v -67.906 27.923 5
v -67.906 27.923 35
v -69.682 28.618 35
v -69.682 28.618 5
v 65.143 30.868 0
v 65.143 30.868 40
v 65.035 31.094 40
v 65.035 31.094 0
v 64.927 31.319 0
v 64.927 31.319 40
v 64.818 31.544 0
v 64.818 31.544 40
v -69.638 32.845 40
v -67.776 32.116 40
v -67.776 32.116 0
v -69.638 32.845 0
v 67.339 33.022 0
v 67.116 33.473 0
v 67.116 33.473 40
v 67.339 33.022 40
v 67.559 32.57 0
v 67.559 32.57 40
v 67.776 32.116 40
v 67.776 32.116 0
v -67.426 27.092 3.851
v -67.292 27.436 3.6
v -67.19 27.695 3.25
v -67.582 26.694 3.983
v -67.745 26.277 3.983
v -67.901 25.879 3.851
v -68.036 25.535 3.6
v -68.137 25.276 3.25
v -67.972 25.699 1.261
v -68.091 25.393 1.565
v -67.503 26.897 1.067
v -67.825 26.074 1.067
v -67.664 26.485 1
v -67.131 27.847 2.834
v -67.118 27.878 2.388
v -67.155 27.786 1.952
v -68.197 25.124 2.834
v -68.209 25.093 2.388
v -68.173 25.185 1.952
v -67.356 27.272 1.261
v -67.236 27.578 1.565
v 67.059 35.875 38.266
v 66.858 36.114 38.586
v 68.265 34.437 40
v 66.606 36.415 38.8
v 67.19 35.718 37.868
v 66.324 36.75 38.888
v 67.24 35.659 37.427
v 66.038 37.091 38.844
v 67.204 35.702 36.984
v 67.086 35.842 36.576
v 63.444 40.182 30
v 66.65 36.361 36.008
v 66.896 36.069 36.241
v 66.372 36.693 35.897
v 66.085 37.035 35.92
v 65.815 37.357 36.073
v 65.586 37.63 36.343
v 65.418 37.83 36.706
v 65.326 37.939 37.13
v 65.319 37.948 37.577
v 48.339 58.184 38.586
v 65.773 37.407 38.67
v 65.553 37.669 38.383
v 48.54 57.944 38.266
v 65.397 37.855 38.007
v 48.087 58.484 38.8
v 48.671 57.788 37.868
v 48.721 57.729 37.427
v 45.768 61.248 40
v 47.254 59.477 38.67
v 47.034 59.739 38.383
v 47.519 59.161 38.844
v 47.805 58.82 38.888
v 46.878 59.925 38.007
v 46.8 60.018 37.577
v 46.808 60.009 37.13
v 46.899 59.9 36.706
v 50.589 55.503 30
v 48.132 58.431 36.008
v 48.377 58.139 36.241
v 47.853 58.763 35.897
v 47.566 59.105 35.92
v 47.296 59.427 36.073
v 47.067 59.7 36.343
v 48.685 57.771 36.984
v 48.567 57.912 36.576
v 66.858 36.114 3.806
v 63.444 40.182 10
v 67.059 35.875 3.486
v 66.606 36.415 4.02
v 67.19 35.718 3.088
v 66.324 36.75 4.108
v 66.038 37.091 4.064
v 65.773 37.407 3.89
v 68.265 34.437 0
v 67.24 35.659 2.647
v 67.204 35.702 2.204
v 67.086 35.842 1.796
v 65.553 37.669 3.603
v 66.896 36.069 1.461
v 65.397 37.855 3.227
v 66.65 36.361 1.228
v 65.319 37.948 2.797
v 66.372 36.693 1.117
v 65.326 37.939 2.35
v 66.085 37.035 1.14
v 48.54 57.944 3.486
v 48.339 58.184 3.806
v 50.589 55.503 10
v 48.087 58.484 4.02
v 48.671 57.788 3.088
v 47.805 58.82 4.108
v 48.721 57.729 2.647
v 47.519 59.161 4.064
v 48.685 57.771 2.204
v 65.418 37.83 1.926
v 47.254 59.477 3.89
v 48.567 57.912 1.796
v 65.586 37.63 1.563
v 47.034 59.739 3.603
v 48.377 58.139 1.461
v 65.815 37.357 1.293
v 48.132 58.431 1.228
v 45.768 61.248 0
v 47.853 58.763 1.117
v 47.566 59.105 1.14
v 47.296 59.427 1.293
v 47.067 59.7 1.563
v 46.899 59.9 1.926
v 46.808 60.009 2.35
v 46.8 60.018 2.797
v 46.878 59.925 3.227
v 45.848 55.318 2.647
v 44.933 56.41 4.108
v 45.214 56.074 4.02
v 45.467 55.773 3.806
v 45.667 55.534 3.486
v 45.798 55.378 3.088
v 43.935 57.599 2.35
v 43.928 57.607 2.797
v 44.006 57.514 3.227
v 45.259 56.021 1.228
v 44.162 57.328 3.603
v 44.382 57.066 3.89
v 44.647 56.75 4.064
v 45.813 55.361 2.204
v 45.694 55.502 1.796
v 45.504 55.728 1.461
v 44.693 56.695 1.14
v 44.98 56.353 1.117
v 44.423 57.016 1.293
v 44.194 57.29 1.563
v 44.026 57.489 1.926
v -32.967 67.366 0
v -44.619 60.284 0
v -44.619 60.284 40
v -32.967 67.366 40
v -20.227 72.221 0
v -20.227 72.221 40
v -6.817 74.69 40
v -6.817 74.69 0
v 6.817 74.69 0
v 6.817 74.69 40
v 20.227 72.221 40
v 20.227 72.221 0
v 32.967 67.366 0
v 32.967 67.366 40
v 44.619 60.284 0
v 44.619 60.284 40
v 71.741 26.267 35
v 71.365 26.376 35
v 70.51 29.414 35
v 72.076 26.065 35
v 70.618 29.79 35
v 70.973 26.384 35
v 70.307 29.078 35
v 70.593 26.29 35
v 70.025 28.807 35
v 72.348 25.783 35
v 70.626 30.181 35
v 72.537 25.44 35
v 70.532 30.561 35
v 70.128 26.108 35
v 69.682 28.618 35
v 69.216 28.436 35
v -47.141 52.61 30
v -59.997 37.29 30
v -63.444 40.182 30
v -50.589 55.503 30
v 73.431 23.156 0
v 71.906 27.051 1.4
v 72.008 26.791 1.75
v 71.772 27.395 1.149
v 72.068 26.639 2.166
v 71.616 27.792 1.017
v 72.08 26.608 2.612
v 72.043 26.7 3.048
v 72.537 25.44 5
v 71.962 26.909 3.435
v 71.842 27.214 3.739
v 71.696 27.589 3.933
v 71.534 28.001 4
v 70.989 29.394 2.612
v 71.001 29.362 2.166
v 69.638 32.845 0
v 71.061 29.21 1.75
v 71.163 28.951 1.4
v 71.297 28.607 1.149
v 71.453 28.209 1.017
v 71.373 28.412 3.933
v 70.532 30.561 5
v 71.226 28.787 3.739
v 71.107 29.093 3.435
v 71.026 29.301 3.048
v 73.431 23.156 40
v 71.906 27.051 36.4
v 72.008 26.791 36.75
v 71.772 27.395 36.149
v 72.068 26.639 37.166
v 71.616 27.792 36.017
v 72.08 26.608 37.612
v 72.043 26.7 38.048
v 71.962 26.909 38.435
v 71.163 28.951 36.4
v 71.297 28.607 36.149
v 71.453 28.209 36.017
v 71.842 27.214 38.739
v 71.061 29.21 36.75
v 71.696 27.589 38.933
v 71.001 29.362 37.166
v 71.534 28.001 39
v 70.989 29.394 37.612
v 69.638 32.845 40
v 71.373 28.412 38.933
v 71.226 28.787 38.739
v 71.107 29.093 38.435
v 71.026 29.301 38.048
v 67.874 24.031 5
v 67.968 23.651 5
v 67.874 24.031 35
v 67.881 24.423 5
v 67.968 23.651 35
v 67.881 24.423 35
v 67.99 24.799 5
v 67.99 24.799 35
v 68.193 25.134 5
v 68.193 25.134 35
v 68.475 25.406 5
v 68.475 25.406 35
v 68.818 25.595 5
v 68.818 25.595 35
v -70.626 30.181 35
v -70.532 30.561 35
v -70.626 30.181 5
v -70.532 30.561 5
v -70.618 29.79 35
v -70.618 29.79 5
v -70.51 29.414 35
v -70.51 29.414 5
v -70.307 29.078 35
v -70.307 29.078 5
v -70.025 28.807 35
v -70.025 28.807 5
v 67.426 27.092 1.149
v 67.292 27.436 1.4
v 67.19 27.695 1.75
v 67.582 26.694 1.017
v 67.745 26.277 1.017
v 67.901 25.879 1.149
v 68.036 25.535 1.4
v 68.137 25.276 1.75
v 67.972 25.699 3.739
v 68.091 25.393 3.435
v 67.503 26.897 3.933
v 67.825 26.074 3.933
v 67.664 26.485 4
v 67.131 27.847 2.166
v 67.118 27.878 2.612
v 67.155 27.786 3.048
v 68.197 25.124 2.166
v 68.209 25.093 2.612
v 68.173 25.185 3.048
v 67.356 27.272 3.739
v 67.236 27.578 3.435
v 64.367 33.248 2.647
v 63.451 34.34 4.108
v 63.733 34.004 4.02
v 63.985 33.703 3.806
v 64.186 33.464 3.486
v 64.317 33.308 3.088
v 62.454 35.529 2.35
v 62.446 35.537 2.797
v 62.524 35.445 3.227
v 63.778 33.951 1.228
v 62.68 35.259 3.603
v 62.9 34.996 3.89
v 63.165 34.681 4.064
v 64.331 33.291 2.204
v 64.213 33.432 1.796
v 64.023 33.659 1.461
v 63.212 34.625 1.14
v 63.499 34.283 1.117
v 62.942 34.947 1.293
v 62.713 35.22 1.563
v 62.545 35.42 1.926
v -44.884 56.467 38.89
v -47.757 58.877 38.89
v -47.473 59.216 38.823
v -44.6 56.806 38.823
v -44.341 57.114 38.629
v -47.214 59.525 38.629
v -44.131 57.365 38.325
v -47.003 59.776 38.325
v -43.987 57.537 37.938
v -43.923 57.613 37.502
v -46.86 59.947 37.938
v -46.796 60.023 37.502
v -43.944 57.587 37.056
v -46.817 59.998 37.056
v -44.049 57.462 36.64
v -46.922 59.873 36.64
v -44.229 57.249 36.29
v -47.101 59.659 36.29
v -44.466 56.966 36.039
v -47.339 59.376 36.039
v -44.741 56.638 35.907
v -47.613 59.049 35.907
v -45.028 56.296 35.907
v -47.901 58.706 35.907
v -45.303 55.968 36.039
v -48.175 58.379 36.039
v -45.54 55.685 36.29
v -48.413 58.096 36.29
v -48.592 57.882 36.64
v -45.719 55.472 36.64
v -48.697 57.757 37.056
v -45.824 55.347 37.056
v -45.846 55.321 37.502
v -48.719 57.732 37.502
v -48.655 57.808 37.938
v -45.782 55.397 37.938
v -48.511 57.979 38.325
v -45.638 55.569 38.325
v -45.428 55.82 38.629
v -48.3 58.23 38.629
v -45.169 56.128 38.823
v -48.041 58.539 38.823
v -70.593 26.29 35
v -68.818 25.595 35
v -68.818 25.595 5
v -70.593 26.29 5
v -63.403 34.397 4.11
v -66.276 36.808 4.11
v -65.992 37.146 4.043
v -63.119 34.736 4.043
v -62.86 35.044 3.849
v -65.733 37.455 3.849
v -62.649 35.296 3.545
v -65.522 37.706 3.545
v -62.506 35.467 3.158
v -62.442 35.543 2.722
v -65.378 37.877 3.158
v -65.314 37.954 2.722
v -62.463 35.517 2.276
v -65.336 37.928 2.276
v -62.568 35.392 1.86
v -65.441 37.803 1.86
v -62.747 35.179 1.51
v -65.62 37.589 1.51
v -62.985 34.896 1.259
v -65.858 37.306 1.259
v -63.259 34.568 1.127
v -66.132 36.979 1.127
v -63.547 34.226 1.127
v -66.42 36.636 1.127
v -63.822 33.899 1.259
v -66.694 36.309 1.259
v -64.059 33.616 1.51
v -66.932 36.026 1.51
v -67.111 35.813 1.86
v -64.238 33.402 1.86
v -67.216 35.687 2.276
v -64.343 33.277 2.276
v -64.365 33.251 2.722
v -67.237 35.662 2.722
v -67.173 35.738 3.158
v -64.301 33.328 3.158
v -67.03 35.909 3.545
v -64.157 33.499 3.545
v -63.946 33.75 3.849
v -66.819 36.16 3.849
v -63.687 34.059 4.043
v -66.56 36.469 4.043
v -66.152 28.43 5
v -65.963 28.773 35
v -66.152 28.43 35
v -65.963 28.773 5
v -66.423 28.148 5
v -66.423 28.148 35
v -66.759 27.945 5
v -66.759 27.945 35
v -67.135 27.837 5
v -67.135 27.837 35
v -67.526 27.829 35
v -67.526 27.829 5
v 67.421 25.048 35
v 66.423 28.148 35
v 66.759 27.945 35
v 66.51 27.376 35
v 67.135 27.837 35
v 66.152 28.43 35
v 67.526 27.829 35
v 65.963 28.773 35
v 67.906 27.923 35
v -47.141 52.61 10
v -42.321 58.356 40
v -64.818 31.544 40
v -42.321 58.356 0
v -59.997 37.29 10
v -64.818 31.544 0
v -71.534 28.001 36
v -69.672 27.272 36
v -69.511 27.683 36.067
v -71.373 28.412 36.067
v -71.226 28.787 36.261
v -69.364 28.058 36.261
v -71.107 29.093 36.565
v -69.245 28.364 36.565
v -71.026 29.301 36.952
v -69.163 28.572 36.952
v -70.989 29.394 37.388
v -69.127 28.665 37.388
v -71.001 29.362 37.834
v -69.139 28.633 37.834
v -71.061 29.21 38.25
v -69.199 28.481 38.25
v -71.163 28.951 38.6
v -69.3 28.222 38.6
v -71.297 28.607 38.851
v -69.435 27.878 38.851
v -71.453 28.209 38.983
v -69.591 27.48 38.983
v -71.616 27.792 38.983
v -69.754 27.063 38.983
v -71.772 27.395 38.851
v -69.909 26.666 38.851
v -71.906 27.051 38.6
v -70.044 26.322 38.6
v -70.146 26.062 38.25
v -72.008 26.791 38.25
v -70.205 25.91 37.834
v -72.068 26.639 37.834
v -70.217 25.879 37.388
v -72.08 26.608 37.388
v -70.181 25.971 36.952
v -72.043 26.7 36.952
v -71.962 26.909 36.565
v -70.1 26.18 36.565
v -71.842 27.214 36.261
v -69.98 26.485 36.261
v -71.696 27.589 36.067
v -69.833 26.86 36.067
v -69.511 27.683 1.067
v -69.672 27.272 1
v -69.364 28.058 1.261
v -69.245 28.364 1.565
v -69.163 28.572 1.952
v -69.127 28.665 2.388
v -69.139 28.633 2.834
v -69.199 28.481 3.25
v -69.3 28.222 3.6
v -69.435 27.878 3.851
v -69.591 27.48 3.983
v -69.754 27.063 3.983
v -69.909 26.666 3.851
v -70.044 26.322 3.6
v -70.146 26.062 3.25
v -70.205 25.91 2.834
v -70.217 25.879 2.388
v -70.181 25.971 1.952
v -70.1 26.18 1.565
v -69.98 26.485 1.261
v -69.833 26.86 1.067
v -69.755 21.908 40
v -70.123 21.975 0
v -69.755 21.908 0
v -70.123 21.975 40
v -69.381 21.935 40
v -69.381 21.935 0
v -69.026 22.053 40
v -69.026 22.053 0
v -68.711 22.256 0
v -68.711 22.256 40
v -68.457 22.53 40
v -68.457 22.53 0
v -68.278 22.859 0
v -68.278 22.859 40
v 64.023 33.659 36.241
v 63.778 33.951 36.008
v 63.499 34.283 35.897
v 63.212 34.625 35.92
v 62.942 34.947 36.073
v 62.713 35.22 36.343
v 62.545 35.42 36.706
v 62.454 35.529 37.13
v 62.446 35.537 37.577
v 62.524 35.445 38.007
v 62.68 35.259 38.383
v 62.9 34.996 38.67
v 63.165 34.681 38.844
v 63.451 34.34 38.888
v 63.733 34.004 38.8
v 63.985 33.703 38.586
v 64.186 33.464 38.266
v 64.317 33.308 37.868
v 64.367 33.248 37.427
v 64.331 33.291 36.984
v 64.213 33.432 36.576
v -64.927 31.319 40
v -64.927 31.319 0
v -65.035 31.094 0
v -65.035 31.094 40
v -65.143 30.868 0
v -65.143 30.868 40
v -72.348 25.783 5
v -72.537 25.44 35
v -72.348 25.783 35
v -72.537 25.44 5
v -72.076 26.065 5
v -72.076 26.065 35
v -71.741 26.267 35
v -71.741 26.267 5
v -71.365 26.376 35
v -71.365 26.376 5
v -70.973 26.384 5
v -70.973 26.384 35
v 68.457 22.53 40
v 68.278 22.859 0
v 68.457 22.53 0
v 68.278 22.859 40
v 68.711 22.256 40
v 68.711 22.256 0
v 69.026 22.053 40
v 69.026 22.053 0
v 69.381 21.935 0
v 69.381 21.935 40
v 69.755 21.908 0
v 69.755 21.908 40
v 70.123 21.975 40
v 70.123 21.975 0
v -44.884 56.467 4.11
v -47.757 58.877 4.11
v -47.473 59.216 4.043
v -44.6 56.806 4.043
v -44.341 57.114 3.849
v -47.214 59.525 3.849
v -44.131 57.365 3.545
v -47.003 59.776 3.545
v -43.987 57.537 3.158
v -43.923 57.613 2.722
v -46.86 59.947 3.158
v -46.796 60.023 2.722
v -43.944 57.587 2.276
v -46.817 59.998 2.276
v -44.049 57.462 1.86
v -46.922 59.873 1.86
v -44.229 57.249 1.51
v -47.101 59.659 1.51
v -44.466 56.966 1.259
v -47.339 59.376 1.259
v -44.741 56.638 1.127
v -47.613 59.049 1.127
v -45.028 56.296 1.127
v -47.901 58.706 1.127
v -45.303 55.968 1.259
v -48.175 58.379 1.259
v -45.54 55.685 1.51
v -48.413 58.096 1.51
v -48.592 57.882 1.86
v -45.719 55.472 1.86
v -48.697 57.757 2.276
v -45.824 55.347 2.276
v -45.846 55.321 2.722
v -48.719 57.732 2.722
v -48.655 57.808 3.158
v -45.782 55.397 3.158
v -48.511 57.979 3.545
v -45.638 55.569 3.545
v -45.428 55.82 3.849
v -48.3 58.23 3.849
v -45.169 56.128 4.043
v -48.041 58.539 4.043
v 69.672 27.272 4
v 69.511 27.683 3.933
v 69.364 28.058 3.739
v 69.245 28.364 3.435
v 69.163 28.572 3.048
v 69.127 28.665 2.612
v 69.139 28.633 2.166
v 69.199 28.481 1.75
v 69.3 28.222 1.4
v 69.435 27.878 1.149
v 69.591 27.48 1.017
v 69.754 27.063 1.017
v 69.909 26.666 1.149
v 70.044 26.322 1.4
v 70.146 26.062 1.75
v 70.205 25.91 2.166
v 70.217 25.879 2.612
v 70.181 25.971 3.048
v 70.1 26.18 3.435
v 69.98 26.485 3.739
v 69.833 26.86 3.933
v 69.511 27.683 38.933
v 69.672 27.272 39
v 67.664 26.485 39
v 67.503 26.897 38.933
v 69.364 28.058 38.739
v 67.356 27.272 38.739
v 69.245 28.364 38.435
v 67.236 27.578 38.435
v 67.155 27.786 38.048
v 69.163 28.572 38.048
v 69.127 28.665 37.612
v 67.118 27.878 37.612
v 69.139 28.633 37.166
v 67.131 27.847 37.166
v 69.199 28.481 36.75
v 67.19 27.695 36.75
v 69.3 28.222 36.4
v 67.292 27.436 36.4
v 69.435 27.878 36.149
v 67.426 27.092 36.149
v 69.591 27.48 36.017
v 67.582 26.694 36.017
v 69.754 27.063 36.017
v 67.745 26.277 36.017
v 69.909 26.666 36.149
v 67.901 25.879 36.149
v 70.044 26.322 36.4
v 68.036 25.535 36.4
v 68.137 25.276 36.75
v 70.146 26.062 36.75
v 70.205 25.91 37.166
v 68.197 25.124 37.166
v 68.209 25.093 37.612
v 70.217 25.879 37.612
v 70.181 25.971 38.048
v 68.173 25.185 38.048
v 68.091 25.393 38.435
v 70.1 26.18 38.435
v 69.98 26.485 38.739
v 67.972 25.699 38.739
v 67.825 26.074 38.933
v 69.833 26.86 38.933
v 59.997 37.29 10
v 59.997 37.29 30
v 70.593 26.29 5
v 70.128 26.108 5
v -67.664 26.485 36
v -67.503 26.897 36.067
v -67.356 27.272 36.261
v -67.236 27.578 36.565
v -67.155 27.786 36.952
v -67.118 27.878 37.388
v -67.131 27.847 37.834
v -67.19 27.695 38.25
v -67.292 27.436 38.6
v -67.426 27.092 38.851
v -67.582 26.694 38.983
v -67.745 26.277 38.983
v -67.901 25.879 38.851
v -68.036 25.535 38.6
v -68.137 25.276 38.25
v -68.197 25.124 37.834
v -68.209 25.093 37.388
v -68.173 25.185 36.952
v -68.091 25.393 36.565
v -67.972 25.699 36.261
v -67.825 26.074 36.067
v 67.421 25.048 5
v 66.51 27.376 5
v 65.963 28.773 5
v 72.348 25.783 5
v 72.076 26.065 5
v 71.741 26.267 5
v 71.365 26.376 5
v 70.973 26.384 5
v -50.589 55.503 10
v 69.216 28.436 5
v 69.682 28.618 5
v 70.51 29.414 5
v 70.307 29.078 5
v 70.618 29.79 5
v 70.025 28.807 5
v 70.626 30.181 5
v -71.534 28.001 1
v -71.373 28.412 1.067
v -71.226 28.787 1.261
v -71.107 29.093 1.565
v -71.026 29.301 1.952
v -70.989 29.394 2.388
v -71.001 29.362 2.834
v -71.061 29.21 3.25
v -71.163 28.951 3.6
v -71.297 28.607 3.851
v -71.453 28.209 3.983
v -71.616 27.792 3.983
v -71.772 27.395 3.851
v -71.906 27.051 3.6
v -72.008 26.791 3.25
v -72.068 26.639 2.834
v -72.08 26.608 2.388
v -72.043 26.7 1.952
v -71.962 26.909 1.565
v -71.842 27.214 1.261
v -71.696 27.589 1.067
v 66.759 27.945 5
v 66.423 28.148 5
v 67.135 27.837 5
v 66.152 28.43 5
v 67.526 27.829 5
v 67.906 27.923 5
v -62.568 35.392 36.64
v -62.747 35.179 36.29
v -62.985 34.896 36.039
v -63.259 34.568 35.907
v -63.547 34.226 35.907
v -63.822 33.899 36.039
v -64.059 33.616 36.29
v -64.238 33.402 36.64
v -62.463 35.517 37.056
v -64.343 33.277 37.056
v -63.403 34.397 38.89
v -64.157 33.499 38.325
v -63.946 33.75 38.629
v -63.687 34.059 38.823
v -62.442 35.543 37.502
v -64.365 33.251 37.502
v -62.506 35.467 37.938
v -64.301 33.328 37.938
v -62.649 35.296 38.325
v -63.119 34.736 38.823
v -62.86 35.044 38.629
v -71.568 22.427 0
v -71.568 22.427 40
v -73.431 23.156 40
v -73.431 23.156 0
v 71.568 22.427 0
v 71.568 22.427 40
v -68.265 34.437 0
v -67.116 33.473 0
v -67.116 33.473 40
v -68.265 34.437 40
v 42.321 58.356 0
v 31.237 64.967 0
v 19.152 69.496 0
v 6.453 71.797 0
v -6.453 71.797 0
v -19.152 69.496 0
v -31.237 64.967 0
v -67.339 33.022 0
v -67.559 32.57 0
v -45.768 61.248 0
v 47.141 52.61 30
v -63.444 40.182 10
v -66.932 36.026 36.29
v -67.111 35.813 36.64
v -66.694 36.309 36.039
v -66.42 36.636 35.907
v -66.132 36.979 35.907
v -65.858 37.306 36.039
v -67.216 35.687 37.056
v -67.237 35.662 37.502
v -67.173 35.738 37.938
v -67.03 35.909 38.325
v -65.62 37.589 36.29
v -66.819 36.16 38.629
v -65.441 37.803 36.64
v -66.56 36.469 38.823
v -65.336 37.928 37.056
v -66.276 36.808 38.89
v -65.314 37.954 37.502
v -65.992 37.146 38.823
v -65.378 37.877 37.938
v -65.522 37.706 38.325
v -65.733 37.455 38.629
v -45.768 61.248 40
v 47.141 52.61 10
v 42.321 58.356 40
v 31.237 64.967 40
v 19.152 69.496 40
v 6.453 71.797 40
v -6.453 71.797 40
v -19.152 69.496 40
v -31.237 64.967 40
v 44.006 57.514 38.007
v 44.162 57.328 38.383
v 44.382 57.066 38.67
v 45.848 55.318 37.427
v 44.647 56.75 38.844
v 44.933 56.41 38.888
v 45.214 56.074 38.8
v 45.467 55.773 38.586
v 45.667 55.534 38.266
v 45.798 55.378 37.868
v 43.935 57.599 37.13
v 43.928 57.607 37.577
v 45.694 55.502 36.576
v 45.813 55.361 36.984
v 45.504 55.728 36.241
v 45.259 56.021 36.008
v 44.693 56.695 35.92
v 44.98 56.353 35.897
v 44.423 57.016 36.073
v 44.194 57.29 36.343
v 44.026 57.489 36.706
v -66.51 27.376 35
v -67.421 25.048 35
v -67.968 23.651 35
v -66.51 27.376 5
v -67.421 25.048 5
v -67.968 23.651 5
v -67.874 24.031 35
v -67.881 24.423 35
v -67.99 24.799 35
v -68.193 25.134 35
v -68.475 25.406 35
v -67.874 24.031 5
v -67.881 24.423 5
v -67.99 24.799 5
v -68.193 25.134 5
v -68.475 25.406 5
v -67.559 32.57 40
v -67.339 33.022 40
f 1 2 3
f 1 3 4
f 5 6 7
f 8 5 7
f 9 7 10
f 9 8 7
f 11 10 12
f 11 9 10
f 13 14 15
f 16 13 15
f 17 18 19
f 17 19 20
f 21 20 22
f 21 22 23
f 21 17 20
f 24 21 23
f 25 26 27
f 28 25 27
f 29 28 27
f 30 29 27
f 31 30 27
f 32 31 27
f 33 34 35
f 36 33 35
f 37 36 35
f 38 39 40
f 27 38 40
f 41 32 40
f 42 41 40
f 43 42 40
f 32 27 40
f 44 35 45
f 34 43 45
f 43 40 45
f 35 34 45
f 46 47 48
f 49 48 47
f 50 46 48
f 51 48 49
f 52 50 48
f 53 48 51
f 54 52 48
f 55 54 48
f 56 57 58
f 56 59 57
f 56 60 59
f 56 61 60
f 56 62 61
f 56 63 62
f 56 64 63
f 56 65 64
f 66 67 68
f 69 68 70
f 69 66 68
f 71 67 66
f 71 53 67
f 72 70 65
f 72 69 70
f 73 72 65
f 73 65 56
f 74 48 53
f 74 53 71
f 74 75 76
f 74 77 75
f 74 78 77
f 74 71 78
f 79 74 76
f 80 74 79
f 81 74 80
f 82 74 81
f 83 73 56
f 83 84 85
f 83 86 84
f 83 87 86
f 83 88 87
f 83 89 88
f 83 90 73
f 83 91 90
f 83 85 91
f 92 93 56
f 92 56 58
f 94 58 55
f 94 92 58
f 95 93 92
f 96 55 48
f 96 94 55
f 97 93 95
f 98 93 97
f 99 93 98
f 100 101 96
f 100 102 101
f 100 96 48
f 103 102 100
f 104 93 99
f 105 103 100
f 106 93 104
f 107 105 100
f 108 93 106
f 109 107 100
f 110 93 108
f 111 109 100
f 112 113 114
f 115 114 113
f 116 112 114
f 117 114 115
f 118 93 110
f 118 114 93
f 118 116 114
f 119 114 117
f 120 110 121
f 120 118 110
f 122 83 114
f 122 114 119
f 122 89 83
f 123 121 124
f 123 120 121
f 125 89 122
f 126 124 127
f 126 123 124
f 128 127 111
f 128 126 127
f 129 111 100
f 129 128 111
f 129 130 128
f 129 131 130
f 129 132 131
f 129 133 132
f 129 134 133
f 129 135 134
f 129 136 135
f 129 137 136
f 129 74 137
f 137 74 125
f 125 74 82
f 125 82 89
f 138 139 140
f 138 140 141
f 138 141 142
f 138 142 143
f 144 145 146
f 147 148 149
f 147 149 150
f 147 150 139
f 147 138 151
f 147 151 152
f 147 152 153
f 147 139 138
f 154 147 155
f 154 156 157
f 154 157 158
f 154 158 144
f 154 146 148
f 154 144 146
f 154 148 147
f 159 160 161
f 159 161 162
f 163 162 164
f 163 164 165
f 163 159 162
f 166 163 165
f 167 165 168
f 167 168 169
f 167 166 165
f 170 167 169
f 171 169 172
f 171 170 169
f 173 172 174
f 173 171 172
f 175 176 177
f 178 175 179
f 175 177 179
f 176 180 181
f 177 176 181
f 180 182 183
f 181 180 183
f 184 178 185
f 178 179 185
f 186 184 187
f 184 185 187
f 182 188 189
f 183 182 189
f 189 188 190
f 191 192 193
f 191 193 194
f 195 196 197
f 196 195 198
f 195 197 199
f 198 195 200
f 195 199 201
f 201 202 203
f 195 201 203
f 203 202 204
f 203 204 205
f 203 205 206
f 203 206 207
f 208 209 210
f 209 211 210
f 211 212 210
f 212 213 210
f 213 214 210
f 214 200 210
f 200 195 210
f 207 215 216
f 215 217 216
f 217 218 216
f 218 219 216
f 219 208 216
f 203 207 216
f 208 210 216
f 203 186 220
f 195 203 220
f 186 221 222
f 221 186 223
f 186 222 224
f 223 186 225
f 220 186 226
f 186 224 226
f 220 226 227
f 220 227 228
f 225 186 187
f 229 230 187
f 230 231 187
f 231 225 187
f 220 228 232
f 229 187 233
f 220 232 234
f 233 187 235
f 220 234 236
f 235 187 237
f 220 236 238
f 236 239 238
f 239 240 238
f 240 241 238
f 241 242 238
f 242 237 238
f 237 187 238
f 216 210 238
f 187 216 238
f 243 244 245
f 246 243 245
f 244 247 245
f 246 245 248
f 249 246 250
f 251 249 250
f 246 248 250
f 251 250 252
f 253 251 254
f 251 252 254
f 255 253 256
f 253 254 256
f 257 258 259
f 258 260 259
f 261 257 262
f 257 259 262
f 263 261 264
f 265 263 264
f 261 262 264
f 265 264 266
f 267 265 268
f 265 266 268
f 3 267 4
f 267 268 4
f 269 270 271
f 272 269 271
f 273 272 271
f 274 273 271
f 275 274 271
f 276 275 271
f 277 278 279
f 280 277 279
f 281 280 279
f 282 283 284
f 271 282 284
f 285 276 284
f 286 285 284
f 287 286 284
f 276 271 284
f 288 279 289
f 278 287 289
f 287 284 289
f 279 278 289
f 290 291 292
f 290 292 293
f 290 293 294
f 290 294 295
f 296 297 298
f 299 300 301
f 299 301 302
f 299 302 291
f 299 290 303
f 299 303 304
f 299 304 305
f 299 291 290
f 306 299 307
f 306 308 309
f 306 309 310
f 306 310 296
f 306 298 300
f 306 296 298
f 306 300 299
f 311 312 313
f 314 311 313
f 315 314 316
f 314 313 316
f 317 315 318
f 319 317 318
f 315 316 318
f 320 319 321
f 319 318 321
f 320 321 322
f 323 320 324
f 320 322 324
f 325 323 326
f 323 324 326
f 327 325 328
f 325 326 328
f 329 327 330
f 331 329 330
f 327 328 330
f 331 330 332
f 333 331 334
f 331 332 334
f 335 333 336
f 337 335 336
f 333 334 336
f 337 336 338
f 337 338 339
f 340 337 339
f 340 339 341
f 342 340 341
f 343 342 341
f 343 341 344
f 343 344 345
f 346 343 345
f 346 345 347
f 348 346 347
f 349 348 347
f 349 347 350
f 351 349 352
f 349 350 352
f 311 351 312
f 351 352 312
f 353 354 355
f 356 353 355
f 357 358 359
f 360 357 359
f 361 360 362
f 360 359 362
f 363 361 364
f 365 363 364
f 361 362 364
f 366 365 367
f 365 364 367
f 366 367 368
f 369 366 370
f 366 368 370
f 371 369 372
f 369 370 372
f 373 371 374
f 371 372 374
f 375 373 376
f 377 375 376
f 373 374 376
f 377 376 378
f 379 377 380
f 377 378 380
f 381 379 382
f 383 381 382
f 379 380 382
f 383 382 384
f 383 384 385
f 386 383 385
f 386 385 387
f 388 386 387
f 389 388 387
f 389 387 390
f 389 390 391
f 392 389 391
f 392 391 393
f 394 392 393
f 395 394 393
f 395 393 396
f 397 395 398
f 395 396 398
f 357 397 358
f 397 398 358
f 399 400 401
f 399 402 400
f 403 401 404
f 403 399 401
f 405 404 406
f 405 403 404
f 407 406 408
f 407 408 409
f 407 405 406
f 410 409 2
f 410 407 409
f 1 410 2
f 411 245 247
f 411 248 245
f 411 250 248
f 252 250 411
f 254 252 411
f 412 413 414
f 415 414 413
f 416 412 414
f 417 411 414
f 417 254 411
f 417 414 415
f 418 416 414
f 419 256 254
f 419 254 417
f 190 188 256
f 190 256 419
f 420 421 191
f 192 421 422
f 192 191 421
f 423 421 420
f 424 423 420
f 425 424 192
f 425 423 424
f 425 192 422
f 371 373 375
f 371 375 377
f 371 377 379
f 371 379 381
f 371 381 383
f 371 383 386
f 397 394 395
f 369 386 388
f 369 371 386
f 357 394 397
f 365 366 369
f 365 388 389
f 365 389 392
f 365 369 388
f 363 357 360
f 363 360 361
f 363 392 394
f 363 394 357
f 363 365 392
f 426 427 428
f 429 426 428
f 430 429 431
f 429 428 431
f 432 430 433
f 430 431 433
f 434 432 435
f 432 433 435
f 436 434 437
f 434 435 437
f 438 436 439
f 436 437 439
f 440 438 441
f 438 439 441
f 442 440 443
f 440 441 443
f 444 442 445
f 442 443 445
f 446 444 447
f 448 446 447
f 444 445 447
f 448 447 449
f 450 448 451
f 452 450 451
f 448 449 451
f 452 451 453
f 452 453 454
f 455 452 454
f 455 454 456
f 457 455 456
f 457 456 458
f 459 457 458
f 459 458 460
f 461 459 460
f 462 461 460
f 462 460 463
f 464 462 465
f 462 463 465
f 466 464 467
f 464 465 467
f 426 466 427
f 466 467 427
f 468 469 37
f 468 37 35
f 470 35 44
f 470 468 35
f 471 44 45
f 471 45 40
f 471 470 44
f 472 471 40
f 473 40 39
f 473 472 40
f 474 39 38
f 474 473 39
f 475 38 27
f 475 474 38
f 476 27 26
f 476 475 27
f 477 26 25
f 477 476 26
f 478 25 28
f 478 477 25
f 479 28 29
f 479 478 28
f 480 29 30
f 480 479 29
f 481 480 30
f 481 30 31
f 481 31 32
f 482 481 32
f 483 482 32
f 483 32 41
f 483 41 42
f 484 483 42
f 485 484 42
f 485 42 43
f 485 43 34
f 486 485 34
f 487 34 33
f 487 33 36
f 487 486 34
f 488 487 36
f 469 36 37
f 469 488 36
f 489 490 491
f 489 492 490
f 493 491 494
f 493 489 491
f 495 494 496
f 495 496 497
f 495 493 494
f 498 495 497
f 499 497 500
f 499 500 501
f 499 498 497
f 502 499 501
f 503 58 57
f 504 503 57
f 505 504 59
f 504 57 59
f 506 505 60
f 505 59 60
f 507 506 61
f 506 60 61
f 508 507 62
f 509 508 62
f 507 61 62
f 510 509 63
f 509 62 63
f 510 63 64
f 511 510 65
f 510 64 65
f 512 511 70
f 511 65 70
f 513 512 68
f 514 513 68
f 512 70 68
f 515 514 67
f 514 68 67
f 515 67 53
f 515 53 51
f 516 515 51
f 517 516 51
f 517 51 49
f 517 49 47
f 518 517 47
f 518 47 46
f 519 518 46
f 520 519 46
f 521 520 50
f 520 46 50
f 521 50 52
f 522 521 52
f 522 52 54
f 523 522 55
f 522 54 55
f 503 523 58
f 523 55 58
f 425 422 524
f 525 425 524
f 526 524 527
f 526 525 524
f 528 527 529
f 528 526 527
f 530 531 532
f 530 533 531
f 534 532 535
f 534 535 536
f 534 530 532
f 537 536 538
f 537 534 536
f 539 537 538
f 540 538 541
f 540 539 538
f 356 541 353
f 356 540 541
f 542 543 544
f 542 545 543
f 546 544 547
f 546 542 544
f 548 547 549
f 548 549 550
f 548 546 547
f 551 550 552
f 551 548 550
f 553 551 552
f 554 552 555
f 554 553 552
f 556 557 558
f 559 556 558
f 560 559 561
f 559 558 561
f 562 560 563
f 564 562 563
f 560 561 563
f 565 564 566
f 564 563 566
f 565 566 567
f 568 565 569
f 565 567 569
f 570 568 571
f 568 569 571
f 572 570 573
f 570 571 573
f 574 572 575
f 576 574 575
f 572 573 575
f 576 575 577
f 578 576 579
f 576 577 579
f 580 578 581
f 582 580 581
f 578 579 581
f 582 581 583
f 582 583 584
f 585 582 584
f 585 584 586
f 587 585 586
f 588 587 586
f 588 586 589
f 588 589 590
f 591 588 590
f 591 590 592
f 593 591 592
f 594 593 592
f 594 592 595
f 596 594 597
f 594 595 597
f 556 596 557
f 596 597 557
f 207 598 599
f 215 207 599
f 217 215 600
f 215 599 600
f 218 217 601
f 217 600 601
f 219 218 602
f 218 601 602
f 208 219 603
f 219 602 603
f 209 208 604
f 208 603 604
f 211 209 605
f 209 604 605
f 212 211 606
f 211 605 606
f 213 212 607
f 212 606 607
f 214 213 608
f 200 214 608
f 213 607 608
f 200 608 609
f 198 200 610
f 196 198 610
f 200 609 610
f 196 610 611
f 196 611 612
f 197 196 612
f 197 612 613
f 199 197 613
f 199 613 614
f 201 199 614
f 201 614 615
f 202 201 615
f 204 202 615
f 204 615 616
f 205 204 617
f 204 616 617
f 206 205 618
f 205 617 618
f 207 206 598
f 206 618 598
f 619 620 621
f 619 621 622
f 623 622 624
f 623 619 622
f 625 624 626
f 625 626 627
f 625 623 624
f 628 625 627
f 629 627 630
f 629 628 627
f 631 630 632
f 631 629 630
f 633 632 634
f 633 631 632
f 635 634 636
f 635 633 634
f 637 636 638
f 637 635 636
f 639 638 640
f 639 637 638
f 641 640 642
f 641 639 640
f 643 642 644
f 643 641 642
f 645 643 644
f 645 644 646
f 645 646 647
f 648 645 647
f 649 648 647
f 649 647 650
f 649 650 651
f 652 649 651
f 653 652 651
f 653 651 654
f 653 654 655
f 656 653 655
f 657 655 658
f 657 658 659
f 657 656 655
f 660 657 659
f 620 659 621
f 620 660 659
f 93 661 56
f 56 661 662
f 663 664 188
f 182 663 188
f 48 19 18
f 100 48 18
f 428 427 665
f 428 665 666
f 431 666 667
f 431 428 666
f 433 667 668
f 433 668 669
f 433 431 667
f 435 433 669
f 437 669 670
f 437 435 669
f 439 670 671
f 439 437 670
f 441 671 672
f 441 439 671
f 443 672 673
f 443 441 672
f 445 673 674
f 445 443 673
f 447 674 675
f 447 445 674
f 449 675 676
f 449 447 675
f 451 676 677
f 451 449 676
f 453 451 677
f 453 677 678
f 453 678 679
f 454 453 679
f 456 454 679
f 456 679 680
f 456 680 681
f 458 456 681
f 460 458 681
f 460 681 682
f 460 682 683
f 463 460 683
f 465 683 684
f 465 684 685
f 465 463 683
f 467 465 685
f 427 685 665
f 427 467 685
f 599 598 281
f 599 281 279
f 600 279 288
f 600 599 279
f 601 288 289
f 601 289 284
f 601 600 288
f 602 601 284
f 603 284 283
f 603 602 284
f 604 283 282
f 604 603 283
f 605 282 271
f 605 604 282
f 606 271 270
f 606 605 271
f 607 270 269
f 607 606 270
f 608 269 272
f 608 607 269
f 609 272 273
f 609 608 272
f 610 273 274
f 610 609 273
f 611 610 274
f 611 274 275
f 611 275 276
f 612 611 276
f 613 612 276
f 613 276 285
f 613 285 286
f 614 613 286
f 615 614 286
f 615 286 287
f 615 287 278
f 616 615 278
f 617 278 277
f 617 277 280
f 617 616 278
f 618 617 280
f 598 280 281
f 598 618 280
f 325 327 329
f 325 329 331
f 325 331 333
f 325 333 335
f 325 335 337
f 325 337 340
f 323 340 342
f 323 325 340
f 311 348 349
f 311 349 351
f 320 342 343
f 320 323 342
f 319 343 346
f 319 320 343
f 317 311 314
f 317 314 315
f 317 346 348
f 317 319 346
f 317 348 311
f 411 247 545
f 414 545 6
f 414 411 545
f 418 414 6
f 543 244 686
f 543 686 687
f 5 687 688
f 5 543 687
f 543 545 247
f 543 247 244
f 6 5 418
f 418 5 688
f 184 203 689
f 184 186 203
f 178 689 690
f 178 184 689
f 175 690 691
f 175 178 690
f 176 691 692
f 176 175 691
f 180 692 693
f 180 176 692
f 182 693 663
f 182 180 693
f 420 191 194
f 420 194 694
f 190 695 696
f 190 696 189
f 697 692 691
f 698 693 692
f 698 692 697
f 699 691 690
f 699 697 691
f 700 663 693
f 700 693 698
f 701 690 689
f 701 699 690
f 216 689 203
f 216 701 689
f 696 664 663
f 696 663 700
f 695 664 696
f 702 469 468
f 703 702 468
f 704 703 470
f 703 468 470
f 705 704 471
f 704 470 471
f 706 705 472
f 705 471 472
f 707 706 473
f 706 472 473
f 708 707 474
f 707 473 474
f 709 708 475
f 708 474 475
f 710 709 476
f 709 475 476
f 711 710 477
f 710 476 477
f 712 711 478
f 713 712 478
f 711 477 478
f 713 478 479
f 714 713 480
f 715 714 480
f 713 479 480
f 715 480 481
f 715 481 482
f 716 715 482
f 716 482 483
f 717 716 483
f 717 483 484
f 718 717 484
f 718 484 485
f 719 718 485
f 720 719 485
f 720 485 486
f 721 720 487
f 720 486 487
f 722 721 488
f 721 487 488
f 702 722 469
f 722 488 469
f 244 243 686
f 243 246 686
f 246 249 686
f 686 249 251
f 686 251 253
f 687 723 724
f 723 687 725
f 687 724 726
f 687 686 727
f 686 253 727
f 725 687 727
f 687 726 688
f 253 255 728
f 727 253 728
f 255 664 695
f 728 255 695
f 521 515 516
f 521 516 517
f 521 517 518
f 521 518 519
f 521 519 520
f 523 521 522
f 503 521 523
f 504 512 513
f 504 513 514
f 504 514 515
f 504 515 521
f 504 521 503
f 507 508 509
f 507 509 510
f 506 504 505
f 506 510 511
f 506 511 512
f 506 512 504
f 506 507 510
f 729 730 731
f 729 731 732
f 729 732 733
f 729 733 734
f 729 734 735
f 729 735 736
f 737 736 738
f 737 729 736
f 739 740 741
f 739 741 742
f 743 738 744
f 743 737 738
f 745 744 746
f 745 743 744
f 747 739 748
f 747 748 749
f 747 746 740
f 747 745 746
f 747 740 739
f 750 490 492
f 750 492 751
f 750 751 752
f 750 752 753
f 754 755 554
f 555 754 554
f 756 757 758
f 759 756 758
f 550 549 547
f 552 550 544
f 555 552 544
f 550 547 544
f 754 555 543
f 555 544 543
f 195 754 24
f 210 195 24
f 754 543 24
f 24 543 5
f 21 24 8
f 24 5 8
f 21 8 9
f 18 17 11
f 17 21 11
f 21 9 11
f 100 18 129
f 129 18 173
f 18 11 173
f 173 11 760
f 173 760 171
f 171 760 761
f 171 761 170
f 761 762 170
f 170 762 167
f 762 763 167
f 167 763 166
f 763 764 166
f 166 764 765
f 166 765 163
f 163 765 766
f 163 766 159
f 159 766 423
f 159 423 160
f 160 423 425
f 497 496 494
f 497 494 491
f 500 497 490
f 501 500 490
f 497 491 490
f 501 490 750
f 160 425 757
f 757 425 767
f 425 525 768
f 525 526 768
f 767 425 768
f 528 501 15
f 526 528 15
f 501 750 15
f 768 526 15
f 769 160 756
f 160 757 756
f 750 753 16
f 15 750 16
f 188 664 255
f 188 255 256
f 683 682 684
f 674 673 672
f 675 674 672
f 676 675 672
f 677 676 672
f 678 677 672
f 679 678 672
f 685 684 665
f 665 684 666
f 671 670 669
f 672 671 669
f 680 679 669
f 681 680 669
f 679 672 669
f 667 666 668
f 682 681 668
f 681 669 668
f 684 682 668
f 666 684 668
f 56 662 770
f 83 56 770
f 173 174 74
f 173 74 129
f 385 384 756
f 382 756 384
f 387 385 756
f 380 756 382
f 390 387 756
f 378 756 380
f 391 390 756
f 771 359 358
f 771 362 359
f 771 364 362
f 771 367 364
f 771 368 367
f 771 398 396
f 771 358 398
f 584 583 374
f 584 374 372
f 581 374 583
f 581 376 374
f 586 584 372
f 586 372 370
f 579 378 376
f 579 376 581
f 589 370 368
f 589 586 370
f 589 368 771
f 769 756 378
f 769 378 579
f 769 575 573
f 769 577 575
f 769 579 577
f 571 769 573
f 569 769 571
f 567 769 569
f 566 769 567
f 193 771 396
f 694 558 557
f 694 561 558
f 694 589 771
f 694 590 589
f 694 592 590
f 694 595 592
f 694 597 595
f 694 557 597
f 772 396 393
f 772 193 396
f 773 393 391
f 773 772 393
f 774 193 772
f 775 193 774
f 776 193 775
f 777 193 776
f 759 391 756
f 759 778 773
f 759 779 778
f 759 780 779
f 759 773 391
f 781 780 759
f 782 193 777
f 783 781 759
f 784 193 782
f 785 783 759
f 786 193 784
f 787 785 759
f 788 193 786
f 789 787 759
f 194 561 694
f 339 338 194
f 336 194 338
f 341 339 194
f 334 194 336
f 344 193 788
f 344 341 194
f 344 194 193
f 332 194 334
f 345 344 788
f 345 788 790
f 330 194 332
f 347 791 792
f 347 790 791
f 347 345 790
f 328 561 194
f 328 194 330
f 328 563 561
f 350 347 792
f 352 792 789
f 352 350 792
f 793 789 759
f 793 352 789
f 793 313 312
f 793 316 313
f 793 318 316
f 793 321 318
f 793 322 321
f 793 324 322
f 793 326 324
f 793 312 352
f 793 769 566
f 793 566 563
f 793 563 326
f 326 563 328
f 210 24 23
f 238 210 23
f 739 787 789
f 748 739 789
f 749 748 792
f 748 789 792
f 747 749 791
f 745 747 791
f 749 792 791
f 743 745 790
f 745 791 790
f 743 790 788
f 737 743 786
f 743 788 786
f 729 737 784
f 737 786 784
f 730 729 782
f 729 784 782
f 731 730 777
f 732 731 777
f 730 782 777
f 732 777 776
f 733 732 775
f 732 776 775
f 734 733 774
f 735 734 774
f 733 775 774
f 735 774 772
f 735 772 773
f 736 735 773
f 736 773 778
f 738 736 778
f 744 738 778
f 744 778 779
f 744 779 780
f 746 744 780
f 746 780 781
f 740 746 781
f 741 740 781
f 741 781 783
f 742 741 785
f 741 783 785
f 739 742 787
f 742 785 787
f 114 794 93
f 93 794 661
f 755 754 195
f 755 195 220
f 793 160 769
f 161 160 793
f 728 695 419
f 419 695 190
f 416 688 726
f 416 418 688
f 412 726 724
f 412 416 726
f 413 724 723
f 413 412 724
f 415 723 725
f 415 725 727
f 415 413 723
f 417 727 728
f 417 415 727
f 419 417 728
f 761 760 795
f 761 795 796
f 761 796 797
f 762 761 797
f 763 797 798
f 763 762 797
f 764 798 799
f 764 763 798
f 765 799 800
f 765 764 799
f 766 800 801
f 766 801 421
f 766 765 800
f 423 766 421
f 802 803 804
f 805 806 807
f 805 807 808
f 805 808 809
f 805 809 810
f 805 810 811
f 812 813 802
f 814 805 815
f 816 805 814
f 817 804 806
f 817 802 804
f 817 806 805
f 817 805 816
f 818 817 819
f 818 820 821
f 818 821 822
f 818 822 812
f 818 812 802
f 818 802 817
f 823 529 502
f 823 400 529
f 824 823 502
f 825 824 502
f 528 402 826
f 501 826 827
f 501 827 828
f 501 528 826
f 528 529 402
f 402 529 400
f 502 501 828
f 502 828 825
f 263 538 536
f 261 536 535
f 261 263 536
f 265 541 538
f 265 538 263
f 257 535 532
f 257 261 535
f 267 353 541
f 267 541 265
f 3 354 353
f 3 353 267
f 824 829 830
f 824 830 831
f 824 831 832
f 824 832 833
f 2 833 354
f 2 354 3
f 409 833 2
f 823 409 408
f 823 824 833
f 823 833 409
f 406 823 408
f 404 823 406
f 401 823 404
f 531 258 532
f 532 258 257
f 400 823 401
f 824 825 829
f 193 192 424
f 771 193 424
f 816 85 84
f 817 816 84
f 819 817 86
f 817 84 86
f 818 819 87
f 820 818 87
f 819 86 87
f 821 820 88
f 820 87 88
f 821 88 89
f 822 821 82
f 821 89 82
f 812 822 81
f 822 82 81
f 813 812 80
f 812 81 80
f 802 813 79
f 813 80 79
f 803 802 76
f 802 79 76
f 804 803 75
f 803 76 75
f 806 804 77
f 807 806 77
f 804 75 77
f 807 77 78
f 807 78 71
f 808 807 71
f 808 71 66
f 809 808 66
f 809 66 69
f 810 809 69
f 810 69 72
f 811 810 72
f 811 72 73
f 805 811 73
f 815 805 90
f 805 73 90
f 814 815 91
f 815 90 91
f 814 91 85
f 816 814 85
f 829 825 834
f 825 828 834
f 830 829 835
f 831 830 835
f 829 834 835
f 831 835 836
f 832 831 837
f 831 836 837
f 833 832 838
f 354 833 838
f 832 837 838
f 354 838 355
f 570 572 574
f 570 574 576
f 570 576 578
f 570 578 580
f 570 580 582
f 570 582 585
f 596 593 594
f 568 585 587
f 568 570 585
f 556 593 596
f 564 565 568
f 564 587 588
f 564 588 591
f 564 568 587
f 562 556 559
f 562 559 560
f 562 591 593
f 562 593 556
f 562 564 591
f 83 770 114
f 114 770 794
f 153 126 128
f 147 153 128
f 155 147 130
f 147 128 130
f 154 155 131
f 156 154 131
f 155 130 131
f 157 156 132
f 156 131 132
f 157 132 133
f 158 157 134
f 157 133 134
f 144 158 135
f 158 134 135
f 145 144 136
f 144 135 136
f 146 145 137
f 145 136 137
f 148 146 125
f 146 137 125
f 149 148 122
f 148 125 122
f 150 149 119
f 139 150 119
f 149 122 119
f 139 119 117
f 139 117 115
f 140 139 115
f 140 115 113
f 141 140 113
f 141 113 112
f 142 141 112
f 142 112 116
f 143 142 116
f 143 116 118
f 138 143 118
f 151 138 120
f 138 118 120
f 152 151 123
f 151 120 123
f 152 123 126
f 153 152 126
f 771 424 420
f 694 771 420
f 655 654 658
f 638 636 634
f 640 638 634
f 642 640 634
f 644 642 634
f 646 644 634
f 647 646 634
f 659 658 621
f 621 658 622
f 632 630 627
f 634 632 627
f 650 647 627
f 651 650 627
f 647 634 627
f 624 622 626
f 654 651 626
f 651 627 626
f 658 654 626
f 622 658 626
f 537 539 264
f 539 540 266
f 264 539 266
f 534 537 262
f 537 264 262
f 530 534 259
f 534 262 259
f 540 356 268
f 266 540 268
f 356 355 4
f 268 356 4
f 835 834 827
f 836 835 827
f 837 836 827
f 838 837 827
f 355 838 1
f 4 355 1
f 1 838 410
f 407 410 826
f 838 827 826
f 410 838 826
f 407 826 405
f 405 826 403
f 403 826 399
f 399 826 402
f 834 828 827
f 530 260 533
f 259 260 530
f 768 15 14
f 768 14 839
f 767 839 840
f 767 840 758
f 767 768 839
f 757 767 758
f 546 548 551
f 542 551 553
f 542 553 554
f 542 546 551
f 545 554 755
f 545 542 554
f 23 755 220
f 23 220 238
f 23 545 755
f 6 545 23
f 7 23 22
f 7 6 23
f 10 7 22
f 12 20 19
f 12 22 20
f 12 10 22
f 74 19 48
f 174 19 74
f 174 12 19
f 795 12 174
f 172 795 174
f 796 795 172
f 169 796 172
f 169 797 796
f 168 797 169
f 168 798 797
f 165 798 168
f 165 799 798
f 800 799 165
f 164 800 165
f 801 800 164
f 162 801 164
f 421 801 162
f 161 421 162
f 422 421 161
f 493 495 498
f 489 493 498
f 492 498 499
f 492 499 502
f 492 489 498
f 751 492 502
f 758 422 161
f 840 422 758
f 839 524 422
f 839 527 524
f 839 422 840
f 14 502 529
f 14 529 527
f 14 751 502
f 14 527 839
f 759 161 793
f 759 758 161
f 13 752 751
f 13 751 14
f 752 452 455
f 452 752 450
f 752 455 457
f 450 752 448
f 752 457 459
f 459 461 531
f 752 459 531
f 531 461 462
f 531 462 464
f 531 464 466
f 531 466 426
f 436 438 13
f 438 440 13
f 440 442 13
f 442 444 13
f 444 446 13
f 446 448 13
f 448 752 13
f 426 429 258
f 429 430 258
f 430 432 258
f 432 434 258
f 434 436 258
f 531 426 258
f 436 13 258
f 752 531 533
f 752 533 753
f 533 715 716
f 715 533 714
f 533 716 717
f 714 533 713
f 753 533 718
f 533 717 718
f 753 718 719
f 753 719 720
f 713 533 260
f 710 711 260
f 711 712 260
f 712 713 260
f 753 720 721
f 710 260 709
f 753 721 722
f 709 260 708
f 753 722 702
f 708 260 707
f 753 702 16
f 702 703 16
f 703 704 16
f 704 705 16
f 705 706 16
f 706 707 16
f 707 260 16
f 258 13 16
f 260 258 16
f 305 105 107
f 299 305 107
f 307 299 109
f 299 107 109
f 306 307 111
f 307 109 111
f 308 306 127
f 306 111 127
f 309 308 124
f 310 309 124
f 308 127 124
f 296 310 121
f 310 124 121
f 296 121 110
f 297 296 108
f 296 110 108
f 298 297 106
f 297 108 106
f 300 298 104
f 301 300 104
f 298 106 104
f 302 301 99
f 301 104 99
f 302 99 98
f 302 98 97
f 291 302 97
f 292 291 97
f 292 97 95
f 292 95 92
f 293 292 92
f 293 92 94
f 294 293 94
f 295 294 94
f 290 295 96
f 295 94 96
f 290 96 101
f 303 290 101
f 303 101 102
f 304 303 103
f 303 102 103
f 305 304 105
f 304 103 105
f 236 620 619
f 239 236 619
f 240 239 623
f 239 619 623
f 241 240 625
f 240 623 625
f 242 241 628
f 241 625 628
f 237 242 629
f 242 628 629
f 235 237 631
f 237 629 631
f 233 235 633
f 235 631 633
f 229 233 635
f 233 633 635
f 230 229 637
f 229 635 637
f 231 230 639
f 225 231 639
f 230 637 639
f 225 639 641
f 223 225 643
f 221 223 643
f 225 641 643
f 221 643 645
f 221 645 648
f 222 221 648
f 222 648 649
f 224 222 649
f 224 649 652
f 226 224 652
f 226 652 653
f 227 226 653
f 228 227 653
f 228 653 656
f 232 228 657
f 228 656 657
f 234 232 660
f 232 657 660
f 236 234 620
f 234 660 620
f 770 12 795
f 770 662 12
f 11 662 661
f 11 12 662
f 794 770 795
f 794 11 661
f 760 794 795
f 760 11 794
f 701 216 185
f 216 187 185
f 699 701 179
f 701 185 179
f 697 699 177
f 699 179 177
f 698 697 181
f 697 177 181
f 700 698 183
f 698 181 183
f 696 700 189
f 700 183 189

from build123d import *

# Parameters (mm, degrees)
BOSS_EXTRUDE1_DEPTH = 40
SKETCH8_W           = 40
SKETCH8_H           = 35
BOSS_EXTRUDE2_DEPTH = 1.5
SKETCH9_W           = 40
SKETCH9_H           = 35
BOSS_EXTRUDE3_DEPTH = 1.5
SKETCH11_R          = 1.5
CUT_EXTRUDE1_DEPTH  = 3.75
SKETCH12_R          = 1.5
CUT_EXTRUDE2_DEPTH  = 3.75
SKETCH4_W           = 20
SKETCH4_H           = 20
CUT_EXTRUDE3_DEPTH  = 4.5
CUT_EXTRUDE4_DEPTH  = 4.5
BOSS_EXTRUDE5_DEPTH = 40
SKETCH15_W          = 40
SKETCH15_H          = 10.404209308
SKETCH15_R          = 1.5
SKETCH15_W_2        = 30
SKETCH15_H_2        = 2.5
BOSS_EXTRUDE6_DEPTH = 2
SKETCH15_2_W        = 30
SKETCH15_2_H        = 2.5
CUT_EXTRUDE5_DEPTH  = 2.906774
SKETCH15_3_R        = 1.5
CUT_EXTRUDE6_DEPTH  = 2.156774
SKETCH17_W          = 40
SKETCH17_H          = 10.404209308
SKETCH17_R          = 1.5
SKETCH17_W_2        = 30
SKETCH17_H_2        = 2.5
BOSS_EXTRUDE7_DEPTH = 2
SKETCH17_2_R        = 1.5
CUT_EXTRUDE7_DEPTH  = 2.156774
SKETCH17_4_W        = 30
SKETCH17_4_H        = 2.5
CUT_EXTRUDE9_DEPTH  = 2.906774
FILLET1_R           = 1.5


with BuildPart() as part:
    # Sketch2 → Boss-Extrude1 (new body)
    with BuildSketch(Plane.XY):
        with BuildLine():
            Line((-67.116221114, 33.472568819), (-44.618654775, 60.284124329))
            ThreePointArc((-44.618654775, 60.284124329), (0, 75), (44.618654775, 60.284124329))
            Line((44.618654775, 60.284124329), (67.116221114, 33.472568819))
            ThreePointArc((67.116221114, 33.472568819), (67.449471383, 32.795865748), (67.77589897, 32.115845292))
            Line((67.77589897, 32.115845292), (65.142767665, 30.868126871))
            ThreePointArc((65.142767665, 30.868126871), (64.981306989, 31.206588688), (64.818087785, 31.54420599))
            Line((64.818087785, 31.54420599), (42.320521446, 58.3557615))
            ThreePointArc((42.320521446, 58.3557615), (0, 72.086208359), (-42.320521446, 58.3557615))
            Line((-42.320521446, 58.3557615), (-64.818087785, 31.54420599))
            ThreePointArc((-64.818087785, 31.54420599), (-64.981306989, 31.206588688), (-65.142767665, 30.868126871))
            Line((-65.142767665, 30.868126871), (-67.77589897, 32.115845292))
            ThreePointArc((-67.77589897, 32.115845292), (-67.449471383, 32.795865748), (-67.116221114, 33.472568819))
        make_face()
    extrude(amount=BOSS_EXTRUDE1_DEPTH)

    # Sketch8 → Boss-Extrude2 (add)
    with BuildSketch(Plane(origin=(-55.867437945, 46.878346574, 0), x_dir=(0, 0, 1), z_dir=(-0.766044443, 0.64278761, 0))):
        with Locations((20, 0)):
            Rectangle(SKETCH8_W, SKETCH8_H)
    extrude(amount=BOSS_EXTRUDE2_DEPTH)

    # Sketch9 → Boss-Extrude3 (add)
    with BuildSketch(Plane(origin=(55.867437945, 46.878346574, 0), x_dir=(0, 0, -1), z_dir=(0.766044443, 0.64278761, 0))):
        with Locations((-20, 0)):
            Rectangle(SKETCH9_W, SKETCH9_H)
    extrude(amount=BOSS_EXTRUDE3_DEPTH)

    # Sketch11 → Cut-Extrude1 (cut)
    with BuildSketch(Plane(origin=(-57.016504609, 47.842527989, 0), x_dir=(0, 0, 1), z_dir=(-0.766044443, 0.64278761, 0))):
        with Locations((37.39, 14.405)):
            Circle(SKETCH11_R)
        with Locations((2.61, 14.405)):
            Circle(SKETCH11_R)
        with Locations((2.61, -14.405)):
            Circle(SKETCH11_R)
        with Locations((37.39, -14.405)):
            Circle(SKETCH11_R)
    extrude(amount=-CUT_EXTRUDE1_DEPTH, mode=Mode.SUBTRACT)

    # Sketch12 → Cut-Extrude2 (cut)
    with BuildSketch(Plane(origin=(57.016504609, 47.842527989, 58.957611892), x_dir=(0.413175911, -0.492403877, -0.766044443), z_dir=(0.766044443, 0.64278761, 0))):
        with Locations((25.781104759, 2.828523492)):
            Circle(SKETCH12_R)
        with Locations((52.42413049, 25.184676556)):
            Circle(SKETCH12_R)
        with Locations((33.905419455, 47.254416963)):
            Circle(SKETCH12_R)
        with Locations((7.262393724, 24.898263898)):
            Circle(SKETCH12_R)
    extrude(amount=-CUT_EXTRUDE2_DEPTH, mode=Mode.SUBTRACT)

    # Sketch4 → Cut-Extrude3 (cut)
    with BuildSketch(Plane(origin=(-53.569304615, 44.949983745, 0), x_dir=(0, 0, -1), z_dir=(0.766044443, -0.64278761, 0))):
        with Locations((-20, 0)):
            Rectangle(SKETCH4_W, SKETCH4_H)
    extrude(amount=-CUT_EXTRUDE3_DEPTH, mode=Mode.SUBTRACT)

    # Sketch7 → Cut-Extrude4 (cut)
    with BuildSketch(Plane(origin=(53.569304615, 44.949983745, -58.957611892), x_dir=(0.413175911, -0.492403877, 0.766044443), z_dir=(-0.766044443, -0.64278761, 0))):
        Polygon((59.252471497, 36.664654087), (74.57336036, 49.52040628), (61.717608166, 64.841295143), (46.396719304, 51.985542949), align=None)
    extrude(amount=-CUT_EXTRUDE4_DEPTH, mode=Mode.SUBTRACT)

    # Sketch14 → Boss-Extrude5 (add)
    with BuildSketch(Plane.XY):
        Polygon((-68.787763199, 21.556091242), (-71.568228616, 22.427408515), (-67.77589897, 32.115845292), (-65.142767665, 30.868126871), align=None)
        Polygon((68.787763199, 21.556091242), (65.142767665, 30.868126871), (67.77589897, 32.115845292), (71.568228616, 22.427408515), align=None)
    extrude(amount=BOSS_EXTRUDE5_DEPTH)

    # Sketch15 → Boss-Extrude6 (add)
    with BuildSketch(Plane(origin=(-69.672063793, 27.271626904, 0), x_dir=(0, 0, -1), z_dir=(0.931203563, -0.364499553, 0))):
        with Locations((-20, 0)):
            Rectangle(SKETCH15_W, SKETCH15_H)
        with Locations((-37.5, 0)):
            Circle(SKETCH15_R, mode=Mode.SUBTRACT)
        with Locations((-2.5, 0)):
            Circle(SKETCH15_R, mode=Mode.SUBTRACT)
        with Locations((-20, 0)):
            Rectangle(SKETCH15_W_2, SKETCH15_H_2, mode=Mode.SUBTRACT)
    extrude(amount=-BOSS_EXTRUDE6_DEPTH)

    # Sketch15<2> → Cut-Extrude5 (cut)
    with BuildSketch(Plane(origin=(-69.672063793, 27.271626904, 0), x_dir=(0, 0, -1), z_dir=(0.931203563, -0.364499553, 0))):
        with Locations((-20, 0)):
            Rectangle(SKETCH15_2_W, SKETCH15_2_H)
    extrude(amount=CUT_EXTRUDE5_DEPTH, mode=Mode.SUBTRACT)

    # Sketch15<3> → Cut-Extrude6 (cut)
    with BuildSketch(Plane(origin=(-69.672063793, 27.271626904, 0), x_dir=(0, 0, -1), z_dir=(0.931203563, -0.364499553, 0))):
        with Locations((-37.5, 0)):
            Circle(SKETCH15_3_R)
        with Locations((-2.5, 0)):
            Circle(SKETCH15_3_R)
    extrude(amount=CUT_EXTRUDE6_DEPTH, mode=Mode.SUBTRACT)

    # Sketch17 → Boss-Extrude7 (add)
    with BuildSketch(Plane(origin=(69.672063793, 27.271626904, 0), x_dir=(0, 0, 1), z_dir=(-0.931203563, -0.364499553, 0))):
        with Locations((20, 0)):
            Rectangle(SKETCH17_W, SKETCH17_H)
        with Locations((2.5, 0)):
            Circle(SKETCH17_R, mode=Mode.SUBTRACT)
        with Locations((37.5, 0)):
            Circle(SKETCH17_R, mode=Mode.SUBTRACT)
        with Locations((20, 0)):
            Rectangle(SKETCH17_W_2, SKETCH17_H_2, mode=Mode.SUBTRACT)
    extrude(amount=-BOSS_EXTRUDE7_DEPTH)

    # Sketch17<2> → Cut-Extrude7 (cut)
    with BuildSketch(Plane(origin=(69.672063793, 27.271626904, 0), x_dir=(0, 0, 1), z_dir=(-0.931203563, -0.364499553, 0))):
        with Locations((37.5, 0)):
            Circle(SKETCH17_2_R)
        with Locations((2.5, 0)):
            Circle(SKETCH17_2_R)
    extrude(amount=CUT_EXTRUDE7_DEPTH, mode=Mode.SUBTRACT)

    # Sketch17<4> → Cut-Extrude9 (cut)
    with BuildSketch(Plane(origin=(69.672063793, 27.271626904, 0), x_dir=(0, 0, 1), z_dir=(-0.931203563, -0.364499553, 0))):
        with Locations((20, 0)):
            Rectangle(SKETCH17_4_W, SKETCH17_4_H)
    extrude(amount=CUT_EXTRUDE9_DEPTH, mode=Mode.SUBTRACT)

    # Fillet1
    fillet1_edges = [part.edges().sort_by_distance(p)[0] for p in [
        (-68.787763199, 21.556091242, 20),
        (68.787763199, 21.556091242, 20),
        (-71.990095361, 26.836621557, 20),
        (-71.078846477, 29.164630464, 20),
        (-67.42088993, 25.048104625, 20),
        (-66.509641046, 27.376113532, 20),
        (71.078846477, 29.164630464, 20),
        (71.990095361, 26.836621557, 20),
        (66.509641046, 27.376113532, 20),
        (67.42088993, 25.048104625, 20),
    ]]
    fillet(fillet1_edges, radius=FILLET1_R)


solid = part.part
